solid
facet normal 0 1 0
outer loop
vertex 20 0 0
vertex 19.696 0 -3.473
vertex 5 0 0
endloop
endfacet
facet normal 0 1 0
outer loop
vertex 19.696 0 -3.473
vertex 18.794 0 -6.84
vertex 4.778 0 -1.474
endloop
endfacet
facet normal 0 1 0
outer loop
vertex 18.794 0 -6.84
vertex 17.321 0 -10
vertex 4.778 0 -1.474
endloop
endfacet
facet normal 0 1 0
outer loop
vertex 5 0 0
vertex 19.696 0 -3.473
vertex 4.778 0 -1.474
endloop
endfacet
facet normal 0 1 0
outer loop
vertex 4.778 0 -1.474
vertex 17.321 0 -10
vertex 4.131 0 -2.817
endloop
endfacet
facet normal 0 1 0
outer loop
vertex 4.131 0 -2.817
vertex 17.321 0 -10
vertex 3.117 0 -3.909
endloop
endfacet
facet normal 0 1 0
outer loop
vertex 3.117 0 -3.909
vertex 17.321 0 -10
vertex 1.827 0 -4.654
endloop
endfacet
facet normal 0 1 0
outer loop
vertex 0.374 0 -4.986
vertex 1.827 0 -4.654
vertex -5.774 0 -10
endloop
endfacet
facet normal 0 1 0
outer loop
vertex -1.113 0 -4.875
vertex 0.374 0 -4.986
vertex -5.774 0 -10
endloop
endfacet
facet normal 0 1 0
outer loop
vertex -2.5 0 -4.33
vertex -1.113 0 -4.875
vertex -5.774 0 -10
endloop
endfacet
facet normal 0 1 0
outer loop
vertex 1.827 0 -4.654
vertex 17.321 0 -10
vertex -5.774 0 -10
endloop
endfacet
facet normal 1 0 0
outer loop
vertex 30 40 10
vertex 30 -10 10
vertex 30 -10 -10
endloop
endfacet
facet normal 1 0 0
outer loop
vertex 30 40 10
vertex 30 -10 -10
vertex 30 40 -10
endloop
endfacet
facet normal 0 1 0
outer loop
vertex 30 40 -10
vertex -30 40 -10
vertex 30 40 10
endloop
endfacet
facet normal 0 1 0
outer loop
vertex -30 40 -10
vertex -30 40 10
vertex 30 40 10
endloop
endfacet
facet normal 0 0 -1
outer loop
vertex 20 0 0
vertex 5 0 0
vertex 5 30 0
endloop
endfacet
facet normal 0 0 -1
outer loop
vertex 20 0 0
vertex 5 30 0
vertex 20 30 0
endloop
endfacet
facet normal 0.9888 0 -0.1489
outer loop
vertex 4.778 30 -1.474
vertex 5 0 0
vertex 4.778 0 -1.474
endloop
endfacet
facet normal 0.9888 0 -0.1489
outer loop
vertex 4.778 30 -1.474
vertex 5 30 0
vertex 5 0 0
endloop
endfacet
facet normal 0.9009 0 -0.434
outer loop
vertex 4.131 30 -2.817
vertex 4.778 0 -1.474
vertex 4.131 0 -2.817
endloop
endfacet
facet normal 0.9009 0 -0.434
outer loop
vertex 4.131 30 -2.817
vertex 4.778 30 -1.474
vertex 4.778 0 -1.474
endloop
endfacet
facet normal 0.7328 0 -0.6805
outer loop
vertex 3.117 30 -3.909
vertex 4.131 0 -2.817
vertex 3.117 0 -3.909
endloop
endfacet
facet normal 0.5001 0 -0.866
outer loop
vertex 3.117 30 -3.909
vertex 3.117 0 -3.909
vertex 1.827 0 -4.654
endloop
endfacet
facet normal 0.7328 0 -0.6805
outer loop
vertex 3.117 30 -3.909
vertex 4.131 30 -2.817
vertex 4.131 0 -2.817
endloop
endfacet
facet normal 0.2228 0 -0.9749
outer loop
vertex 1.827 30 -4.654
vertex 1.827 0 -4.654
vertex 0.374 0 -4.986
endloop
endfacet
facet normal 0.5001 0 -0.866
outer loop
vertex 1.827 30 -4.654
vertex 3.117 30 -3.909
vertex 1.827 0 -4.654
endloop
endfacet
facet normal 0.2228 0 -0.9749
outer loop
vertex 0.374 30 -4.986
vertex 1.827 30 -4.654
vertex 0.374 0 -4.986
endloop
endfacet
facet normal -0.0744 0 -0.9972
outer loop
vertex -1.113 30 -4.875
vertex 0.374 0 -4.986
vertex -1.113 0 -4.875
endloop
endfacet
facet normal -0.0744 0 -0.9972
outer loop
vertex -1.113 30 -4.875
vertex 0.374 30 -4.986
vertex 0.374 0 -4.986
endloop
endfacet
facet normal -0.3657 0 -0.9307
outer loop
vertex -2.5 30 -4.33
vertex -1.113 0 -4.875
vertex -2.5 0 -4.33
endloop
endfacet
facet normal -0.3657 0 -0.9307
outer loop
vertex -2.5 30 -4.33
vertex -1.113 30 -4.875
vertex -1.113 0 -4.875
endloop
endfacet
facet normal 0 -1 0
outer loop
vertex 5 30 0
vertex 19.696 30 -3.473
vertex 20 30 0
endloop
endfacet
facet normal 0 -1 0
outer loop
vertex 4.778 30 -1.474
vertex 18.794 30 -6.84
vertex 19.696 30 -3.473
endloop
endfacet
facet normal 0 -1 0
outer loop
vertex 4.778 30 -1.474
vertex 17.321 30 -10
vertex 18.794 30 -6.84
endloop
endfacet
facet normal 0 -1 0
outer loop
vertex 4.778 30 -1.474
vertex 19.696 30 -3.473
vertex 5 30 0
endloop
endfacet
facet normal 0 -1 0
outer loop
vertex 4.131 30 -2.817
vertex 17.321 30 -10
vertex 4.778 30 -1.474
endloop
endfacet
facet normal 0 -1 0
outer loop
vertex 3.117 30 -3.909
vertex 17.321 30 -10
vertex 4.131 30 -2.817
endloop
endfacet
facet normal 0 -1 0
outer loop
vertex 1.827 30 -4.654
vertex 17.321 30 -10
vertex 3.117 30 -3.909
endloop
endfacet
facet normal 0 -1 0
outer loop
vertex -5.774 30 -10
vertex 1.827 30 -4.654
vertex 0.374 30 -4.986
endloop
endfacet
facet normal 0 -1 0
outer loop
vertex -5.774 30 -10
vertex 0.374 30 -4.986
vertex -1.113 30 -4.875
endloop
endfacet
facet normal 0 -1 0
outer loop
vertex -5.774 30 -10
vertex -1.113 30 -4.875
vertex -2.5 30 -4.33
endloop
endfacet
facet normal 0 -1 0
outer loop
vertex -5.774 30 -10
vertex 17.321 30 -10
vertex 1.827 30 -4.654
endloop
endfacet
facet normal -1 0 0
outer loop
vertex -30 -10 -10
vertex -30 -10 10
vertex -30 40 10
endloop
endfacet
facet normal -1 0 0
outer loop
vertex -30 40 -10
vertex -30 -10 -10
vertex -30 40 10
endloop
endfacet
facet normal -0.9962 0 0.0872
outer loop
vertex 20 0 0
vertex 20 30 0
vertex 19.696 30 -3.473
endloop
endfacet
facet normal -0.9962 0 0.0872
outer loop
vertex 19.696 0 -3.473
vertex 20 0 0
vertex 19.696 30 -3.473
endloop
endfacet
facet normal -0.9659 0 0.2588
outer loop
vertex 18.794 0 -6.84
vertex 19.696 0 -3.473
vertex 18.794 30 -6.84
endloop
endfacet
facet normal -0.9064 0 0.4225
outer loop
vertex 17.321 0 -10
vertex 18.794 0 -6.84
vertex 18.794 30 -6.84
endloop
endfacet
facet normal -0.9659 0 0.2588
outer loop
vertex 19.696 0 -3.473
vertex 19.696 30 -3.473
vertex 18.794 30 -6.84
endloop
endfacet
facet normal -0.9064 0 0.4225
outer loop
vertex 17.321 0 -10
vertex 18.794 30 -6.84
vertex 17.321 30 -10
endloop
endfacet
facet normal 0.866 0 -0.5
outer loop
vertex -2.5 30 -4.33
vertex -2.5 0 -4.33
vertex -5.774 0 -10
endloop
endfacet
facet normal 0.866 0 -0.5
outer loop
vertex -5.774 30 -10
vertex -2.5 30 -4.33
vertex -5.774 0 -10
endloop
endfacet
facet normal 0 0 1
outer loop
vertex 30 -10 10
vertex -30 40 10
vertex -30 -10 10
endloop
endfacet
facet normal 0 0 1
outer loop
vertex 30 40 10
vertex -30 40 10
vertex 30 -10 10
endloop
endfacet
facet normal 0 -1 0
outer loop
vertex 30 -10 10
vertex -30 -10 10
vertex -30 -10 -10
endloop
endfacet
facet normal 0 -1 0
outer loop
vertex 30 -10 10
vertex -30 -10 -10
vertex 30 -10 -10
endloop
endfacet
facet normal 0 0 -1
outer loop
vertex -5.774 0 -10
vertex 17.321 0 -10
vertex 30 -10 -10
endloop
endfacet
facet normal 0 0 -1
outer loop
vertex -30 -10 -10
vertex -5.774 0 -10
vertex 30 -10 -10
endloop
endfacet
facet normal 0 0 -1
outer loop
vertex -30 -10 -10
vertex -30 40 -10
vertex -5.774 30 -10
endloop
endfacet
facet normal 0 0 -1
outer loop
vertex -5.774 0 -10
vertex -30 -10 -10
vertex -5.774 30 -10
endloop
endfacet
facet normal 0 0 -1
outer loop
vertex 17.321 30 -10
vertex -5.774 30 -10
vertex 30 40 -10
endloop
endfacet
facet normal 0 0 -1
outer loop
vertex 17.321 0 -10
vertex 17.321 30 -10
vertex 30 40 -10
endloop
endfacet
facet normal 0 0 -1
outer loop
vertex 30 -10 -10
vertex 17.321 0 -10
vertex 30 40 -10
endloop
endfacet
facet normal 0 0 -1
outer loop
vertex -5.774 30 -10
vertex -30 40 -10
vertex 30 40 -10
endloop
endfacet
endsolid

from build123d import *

# Parameters (mm, degrees)
SKETCH1_W           = 60
SKETCH1_H           = 50
BOSS_EXTRUDE1_DEPTH = 10
SKETCH2_W           = 15
SKETCH2_H           = 30
CUT_REVOLVE1_ANGLE  = 120


with BuildPart() as part:
    # Sketch1 → Boss-Extrude1 (new, symmetric)
    with BuildSketch(Plane.XY):
        with Locations((0, 15)):
            Rectangle(SKETCH1_W, SKETCH1_H)
    extrude(amount=BOSS_EXTRUDE1_DEPTH, both=True)

    # Sketch2 → Cut-Revolve1 (revolve, cut)
    with BuildSketch(Plane.XY):
        with Locations((12.5, 15)):
            Rectangle(SKETCH2_W, SKETCH2_H)
    revolve(axis=Axis((0, 0, 0), (0, 1, 0)), revolution_arc=CUT_REVOLVE1_ANGLE, mode=Mode.SUBTRACT)


solid = part.part
